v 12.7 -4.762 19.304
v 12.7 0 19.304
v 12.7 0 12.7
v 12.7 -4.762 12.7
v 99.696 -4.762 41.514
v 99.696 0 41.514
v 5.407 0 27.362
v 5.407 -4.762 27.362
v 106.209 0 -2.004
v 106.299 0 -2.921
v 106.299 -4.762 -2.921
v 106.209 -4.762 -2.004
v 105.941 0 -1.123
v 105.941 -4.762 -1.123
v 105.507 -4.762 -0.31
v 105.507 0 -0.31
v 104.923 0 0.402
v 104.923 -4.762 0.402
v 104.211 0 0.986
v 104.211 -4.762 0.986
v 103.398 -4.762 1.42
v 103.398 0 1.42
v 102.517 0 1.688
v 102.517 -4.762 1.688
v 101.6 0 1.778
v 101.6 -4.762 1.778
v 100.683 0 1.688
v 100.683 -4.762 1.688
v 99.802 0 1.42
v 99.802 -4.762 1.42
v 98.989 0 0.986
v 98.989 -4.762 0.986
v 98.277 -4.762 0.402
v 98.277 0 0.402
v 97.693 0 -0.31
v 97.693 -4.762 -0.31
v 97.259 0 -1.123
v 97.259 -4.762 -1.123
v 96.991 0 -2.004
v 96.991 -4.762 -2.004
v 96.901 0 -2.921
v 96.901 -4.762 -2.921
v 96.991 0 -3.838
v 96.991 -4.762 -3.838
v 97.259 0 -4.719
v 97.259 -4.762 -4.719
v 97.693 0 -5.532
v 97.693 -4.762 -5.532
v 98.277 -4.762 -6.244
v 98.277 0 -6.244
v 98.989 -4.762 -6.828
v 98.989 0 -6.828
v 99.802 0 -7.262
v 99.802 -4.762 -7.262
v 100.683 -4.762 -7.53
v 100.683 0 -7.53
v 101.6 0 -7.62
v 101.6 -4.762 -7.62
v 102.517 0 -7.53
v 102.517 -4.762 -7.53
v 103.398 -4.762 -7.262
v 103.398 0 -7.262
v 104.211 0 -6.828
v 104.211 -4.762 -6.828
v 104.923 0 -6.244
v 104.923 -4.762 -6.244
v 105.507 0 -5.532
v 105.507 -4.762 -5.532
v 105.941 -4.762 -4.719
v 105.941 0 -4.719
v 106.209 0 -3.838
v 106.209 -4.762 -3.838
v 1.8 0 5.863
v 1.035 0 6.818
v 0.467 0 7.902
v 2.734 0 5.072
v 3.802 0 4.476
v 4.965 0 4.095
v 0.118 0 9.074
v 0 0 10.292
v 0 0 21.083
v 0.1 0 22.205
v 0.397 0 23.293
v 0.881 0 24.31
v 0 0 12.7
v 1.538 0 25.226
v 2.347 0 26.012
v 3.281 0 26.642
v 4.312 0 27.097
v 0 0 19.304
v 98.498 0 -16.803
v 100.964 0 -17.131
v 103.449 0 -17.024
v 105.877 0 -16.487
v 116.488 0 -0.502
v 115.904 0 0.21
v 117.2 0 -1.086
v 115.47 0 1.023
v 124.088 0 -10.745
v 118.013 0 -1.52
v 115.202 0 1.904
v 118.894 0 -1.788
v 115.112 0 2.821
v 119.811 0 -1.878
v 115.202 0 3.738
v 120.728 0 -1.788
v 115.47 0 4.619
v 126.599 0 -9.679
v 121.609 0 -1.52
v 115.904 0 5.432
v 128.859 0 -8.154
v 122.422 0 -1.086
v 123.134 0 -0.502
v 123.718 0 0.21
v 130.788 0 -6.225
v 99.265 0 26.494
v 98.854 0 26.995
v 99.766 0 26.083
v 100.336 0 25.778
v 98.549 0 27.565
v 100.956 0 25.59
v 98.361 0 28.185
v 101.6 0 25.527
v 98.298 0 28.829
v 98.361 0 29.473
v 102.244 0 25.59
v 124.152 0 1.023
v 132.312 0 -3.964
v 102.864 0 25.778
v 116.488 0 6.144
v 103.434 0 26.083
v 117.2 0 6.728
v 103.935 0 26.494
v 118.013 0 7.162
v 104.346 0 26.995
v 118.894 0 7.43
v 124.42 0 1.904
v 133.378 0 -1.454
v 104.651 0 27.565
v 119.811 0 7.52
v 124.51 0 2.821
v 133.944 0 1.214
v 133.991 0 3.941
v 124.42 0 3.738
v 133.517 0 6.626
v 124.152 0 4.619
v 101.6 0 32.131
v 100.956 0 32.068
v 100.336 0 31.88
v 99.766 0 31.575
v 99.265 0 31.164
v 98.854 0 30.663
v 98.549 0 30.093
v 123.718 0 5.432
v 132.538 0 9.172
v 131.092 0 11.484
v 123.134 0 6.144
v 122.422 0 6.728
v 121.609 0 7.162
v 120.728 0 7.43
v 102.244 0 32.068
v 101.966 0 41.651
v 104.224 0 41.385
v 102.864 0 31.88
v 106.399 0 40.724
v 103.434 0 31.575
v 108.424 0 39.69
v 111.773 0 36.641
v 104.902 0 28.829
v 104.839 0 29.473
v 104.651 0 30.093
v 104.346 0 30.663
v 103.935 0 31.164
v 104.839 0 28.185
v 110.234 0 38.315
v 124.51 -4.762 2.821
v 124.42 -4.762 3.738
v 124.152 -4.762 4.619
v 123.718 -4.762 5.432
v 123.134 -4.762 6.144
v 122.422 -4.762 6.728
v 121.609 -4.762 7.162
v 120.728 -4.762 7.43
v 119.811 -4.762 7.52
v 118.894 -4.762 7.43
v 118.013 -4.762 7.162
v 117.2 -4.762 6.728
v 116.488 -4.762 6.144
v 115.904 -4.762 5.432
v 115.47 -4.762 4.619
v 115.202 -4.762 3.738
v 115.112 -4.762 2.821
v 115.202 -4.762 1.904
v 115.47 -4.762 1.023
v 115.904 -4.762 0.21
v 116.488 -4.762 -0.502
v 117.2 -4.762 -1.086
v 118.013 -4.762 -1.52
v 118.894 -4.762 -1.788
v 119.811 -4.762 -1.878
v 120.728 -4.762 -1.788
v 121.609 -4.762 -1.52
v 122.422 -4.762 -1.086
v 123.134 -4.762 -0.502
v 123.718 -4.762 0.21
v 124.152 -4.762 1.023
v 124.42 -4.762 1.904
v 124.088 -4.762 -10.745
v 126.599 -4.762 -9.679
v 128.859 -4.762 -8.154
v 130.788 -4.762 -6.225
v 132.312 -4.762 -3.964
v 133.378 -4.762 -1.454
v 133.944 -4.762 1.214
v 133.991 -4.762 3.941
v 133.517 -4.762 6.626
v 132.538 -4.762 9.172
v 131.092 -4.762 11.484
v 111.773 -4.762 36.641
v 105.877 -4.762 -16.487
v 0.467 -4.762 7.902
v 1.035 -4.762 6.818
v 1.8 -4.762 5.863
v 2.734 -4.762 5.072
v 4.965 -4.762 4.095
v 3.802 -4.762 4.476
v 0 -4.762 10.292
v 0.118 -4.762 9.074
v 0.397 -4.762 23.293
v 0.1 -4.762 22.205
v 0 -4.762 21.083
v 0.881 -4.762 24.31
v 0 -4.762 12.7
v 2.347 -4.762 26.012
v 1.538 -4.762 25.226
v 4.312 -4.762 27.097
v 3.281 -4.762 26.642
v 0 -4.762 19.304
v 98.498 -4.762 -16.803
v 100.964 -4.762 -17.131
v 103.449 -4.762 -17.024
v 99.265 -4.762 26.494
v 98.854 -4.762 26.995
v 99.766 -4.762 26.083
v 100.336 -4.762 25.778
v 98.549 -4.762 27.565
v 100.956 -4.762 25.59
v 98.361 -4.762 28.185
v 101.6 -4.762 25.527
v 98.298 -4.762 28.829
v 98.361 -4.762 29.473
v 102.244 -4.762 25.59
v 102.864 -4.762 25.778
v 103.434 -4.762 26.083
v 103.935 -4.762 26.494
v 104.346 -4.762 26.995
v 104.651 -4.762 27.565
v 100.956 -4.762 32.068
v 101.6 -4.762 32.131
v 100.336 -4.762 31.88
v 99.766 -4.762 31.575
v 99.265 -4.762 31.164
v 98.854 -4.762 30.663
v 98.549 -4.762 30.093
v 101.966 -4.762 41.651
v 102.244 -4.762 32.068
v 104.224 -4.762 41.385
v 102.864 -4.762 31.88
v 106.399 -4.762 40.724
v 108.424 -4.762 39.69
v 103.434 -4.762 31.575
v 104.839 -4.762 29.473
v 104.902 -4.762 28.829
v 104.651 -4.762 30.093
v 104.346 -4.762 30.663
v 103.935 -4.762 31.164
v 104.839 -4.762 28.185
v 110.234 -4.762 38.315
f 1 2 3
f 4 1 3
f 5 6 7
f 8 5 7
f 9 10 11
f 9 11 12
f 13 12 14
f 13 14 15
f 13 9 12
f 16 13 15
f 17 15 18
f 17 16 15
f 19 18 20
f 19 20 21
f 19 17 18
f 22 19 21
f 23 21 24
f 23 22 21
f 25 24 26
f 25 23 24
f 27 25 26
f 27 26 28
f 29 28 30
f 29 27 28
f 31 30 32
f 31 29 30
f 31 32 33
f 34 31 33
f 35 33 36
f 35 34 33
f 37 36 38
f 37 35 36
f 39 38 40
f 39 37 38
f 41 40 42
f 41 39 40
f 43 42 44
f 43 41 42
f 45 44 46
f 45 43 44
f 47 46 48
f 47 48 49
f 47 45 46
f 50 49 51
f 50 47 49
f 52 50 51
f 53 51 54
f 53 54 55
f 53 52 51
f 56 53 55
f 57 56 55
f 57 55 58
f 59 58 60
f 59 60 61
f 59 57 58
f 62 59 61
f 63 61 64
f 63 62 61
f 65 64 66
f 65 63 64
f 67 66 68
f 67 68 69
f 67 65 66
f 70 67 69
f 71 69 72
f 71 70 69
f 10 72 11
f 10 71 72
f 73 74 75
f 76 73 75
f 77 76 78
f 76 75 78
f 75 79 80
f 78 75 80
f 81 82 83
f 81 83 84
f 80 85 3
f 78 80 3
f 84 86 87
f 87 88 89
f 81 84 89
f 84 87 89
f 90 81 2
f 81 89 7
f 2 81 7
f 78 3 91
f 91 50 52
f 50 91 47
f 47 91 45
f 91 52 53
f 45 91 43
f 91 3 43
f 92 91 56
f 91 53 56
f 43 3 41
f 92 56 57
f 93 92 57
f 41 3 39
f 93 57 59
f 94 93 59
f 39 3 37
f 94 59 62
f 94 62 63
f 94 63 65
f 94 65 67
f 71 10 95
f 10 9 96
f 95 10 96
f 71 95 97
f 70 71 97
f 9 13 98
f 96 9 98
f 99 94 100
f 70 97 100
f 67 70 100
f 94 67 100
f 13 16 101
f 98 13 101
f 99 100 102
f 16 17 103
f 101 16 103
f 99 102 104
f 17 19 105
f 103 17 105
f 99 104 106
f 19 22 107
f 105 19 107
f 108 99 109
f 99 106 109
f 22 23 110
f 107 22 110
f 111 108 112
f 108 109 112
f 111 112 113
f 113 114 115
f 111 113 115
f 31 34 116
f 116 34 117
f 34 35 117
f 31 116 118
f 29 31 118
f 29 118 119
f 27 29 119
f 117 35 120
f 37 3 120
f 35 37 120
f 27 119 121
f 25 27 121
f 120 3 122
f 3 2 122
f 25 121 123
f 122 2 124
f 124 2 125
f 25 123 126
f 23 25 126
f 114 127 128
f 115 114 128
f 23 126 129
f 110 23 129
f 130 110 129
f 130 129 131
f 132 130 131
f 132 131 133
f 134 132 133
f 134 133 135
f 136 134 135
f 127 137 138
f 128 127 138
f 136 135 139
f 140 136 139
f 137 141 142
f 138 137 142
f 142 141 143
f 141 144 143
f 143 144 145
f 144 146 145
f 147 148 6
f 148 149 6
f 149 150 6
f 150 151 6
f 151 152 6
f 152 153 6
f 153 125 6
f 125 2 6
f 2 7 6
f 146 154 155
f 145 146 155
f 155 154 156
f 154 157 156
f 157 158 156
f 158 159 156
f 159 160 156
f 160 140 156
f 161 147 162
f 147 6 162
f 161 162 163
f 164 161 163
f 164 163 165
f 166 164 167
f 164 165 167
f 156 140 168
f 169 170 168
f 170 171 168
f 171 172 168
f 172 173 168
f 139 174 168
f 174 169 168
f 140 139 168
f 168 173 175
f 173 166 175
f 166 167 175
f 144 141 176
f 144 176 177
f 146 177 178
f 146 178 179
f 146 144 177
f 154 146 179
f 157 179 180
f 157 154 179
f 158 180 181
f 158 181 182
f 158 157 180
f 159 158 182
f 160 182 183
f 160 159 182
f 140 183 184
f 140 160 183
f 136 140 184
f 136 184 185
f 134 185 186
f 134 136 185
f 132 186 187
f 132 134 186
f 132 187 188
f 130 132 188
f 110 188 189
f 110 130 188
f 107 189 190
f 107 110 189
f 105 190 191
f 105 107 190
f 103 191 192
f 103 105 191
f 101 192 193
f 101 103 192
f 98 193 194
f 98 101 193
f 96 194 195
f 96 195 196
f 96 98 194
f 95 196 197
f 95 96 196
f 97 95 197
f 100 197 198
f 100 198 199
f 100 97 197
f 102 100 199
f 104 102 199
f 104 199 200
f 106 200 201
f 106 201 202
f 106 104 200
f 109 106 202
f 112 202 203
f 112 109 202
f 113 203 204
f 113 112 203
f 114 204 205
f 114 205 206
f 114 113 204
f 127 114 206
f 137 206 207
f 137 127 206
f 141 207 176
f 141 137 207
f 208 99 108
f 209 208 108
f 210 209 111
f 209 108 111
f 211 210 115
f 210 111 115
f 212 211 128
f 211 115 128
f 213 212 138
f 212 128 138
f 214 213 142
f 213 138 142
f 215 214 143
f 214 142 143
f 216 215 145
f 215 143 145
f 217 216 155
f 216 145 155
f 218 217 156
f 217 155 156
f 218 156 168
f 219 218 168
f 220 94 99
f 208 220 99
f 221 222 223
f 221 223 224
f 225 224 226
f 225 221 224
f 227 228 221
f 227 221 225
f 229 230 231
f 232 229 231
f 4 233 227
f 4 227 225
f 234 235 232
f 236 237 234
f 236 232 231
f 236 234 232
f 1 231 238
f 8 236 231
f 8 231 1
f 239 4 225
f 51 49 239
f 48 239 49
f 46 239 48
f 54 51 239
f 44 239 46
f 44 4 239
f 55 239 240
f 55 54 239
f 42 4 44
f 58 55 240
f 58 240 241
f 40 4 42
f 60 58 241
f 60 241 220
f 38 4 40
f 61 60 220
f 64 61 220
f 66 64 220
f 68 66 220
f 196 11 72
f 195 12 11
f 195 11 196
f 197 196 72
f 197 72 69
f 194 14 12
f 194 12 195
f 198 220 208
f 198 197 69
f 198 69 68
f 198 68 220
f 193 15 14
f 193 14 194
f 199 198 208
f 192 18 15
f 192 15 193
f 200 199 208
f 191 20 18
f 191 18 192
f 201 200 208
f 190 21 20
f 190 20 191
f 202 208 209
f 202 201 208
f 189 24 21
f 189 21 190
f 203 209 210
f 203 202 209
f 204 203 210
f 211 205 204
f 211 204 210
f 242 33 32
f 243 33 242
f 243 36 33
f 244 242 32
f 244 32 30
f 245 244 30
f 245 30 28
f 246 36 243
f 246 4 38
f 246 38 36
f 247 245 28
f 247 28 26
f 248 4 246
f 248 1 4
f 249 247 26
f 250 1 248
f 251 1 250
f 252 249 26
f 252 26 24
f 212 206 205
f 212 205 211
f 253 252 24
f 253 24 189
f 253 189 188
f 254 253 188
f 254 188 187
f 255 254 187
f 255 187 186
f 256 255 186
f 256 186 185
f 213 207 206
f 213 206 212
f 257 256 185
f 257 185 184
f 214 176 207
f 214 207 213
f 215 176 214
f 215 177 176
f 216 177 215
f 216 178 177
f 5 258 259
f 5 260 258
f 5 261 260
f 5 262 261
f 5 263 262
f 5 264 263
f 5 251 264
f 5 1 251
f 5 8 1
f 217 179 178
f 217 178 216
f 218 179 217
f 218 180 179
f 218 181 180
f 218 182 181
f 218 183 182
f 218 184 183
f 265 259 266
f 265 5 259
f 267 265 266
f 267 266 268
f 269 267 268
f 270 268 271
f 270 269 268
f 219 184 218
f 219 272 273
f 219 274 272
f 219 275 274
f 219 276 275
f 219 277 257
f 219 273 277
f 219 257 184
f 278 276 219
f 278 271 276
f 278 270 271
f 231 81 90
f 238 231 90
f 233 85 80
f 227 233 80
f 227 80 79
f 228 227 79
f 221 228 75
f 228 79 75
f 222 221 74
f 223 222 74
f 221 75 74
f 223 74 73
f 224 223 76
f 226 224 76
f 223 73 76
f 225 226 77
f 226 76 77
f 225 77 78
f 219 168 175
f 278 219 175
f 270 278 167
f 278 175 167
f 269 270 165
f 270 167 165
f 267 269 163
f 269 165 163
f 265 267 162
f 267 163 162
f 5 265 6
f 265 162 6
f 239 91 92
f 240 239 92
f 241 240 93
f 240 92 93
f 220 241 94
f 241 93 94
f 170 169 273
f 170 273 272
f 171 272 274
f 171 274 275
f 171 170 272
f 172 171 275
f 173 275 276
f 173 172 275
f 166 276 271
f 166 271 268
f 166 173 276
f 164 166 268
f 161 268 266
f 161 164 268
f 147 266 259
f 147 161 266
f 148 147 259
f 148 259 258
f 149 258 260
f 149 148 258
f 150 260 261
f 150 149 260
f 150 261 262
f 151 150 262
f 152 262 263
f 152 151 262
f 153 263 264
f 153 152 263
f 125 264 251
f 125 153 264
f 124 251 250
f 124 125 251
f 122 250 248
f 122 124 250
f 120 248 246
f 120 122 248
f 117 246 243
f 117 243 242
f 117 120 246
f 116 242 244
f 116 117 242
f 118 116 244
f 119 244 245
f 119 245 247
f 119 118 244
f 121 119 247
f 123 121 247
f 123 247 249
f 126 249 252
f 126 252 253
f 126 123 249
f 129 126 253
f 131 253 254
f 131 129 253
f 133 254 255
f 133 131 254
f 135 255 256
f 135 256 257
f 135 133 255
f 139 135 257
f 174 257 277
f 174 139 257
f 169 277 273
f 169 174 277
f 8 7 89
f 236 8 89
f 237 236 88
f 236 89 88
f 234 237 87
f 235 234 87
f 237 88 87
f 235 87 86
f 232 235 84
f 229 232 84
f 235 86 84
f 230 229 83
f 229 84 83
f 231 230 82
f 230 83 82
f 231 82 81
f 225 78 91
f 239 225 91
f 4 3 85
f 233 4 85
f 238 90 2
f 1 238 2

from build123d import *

# Parameters (mm, degrees)
F0_R     = 4.699
F0_R_2   = 3.302
F1_DEPTH = 4.7625


with BuildPart() as f1:
    # F0 (on Front) → F1 (new body)
    with BuildSketch(Plane.XZ):
        with BuildLine():
            Line((0, 12.7), (0, 10.292423))
            ThreePointArc((0, 10.292423), (1.394452, 6.3219), (4.965369, 4.095222))
            Line((4.965369, 4.095222), (98.498426, -16.80273))
            ThreePointArc((98.498426, -16.80273), (102.208704, -17.13197), (105.877239, -16.48667))
            Line((105.877239, -16.48667), (124.088291, -10.744747))
            ThreePointArc((124.088291, -10.744747), (133.377536, -1.453733), (131.09241, 11.484244))
            Line((131.09241, 11.484244), (111.773368, 36.641459))
            ThreePointArc((111.773368, 36.641459), (106.399109, 40.724398), (99.696147, 41.513923))
            Line((99.696147, 41.513923), (5.407499, 27.362341))
            ThreePointArc((5.407499, 27.362341), (1.538172, 25.226203), (0, 21.082676))
            Line((0, 21.082676), (0, 19.304))
            Line((0, 19.304), (12.7, 19.304))
            Line((12.7, 19.304), (12.7, 12.7))
            Line((12.7, 12.7), (0, 12.7))
        make_face()
        with Locations((101.6, -2.921)):
            Circle(F0_R, mode=Mode.SUBTRACT)
        with Locations((119.811052, 2.820923)):
            Circle(F0_R, mode=Mode.SUBTRACT)
        with Locations((101.6, 28.829)):
            Circle(F0_R_2, mode=Mode.SUBTRACT)
    extrude(amount=F1_DEPTH)


solid = f1.part
